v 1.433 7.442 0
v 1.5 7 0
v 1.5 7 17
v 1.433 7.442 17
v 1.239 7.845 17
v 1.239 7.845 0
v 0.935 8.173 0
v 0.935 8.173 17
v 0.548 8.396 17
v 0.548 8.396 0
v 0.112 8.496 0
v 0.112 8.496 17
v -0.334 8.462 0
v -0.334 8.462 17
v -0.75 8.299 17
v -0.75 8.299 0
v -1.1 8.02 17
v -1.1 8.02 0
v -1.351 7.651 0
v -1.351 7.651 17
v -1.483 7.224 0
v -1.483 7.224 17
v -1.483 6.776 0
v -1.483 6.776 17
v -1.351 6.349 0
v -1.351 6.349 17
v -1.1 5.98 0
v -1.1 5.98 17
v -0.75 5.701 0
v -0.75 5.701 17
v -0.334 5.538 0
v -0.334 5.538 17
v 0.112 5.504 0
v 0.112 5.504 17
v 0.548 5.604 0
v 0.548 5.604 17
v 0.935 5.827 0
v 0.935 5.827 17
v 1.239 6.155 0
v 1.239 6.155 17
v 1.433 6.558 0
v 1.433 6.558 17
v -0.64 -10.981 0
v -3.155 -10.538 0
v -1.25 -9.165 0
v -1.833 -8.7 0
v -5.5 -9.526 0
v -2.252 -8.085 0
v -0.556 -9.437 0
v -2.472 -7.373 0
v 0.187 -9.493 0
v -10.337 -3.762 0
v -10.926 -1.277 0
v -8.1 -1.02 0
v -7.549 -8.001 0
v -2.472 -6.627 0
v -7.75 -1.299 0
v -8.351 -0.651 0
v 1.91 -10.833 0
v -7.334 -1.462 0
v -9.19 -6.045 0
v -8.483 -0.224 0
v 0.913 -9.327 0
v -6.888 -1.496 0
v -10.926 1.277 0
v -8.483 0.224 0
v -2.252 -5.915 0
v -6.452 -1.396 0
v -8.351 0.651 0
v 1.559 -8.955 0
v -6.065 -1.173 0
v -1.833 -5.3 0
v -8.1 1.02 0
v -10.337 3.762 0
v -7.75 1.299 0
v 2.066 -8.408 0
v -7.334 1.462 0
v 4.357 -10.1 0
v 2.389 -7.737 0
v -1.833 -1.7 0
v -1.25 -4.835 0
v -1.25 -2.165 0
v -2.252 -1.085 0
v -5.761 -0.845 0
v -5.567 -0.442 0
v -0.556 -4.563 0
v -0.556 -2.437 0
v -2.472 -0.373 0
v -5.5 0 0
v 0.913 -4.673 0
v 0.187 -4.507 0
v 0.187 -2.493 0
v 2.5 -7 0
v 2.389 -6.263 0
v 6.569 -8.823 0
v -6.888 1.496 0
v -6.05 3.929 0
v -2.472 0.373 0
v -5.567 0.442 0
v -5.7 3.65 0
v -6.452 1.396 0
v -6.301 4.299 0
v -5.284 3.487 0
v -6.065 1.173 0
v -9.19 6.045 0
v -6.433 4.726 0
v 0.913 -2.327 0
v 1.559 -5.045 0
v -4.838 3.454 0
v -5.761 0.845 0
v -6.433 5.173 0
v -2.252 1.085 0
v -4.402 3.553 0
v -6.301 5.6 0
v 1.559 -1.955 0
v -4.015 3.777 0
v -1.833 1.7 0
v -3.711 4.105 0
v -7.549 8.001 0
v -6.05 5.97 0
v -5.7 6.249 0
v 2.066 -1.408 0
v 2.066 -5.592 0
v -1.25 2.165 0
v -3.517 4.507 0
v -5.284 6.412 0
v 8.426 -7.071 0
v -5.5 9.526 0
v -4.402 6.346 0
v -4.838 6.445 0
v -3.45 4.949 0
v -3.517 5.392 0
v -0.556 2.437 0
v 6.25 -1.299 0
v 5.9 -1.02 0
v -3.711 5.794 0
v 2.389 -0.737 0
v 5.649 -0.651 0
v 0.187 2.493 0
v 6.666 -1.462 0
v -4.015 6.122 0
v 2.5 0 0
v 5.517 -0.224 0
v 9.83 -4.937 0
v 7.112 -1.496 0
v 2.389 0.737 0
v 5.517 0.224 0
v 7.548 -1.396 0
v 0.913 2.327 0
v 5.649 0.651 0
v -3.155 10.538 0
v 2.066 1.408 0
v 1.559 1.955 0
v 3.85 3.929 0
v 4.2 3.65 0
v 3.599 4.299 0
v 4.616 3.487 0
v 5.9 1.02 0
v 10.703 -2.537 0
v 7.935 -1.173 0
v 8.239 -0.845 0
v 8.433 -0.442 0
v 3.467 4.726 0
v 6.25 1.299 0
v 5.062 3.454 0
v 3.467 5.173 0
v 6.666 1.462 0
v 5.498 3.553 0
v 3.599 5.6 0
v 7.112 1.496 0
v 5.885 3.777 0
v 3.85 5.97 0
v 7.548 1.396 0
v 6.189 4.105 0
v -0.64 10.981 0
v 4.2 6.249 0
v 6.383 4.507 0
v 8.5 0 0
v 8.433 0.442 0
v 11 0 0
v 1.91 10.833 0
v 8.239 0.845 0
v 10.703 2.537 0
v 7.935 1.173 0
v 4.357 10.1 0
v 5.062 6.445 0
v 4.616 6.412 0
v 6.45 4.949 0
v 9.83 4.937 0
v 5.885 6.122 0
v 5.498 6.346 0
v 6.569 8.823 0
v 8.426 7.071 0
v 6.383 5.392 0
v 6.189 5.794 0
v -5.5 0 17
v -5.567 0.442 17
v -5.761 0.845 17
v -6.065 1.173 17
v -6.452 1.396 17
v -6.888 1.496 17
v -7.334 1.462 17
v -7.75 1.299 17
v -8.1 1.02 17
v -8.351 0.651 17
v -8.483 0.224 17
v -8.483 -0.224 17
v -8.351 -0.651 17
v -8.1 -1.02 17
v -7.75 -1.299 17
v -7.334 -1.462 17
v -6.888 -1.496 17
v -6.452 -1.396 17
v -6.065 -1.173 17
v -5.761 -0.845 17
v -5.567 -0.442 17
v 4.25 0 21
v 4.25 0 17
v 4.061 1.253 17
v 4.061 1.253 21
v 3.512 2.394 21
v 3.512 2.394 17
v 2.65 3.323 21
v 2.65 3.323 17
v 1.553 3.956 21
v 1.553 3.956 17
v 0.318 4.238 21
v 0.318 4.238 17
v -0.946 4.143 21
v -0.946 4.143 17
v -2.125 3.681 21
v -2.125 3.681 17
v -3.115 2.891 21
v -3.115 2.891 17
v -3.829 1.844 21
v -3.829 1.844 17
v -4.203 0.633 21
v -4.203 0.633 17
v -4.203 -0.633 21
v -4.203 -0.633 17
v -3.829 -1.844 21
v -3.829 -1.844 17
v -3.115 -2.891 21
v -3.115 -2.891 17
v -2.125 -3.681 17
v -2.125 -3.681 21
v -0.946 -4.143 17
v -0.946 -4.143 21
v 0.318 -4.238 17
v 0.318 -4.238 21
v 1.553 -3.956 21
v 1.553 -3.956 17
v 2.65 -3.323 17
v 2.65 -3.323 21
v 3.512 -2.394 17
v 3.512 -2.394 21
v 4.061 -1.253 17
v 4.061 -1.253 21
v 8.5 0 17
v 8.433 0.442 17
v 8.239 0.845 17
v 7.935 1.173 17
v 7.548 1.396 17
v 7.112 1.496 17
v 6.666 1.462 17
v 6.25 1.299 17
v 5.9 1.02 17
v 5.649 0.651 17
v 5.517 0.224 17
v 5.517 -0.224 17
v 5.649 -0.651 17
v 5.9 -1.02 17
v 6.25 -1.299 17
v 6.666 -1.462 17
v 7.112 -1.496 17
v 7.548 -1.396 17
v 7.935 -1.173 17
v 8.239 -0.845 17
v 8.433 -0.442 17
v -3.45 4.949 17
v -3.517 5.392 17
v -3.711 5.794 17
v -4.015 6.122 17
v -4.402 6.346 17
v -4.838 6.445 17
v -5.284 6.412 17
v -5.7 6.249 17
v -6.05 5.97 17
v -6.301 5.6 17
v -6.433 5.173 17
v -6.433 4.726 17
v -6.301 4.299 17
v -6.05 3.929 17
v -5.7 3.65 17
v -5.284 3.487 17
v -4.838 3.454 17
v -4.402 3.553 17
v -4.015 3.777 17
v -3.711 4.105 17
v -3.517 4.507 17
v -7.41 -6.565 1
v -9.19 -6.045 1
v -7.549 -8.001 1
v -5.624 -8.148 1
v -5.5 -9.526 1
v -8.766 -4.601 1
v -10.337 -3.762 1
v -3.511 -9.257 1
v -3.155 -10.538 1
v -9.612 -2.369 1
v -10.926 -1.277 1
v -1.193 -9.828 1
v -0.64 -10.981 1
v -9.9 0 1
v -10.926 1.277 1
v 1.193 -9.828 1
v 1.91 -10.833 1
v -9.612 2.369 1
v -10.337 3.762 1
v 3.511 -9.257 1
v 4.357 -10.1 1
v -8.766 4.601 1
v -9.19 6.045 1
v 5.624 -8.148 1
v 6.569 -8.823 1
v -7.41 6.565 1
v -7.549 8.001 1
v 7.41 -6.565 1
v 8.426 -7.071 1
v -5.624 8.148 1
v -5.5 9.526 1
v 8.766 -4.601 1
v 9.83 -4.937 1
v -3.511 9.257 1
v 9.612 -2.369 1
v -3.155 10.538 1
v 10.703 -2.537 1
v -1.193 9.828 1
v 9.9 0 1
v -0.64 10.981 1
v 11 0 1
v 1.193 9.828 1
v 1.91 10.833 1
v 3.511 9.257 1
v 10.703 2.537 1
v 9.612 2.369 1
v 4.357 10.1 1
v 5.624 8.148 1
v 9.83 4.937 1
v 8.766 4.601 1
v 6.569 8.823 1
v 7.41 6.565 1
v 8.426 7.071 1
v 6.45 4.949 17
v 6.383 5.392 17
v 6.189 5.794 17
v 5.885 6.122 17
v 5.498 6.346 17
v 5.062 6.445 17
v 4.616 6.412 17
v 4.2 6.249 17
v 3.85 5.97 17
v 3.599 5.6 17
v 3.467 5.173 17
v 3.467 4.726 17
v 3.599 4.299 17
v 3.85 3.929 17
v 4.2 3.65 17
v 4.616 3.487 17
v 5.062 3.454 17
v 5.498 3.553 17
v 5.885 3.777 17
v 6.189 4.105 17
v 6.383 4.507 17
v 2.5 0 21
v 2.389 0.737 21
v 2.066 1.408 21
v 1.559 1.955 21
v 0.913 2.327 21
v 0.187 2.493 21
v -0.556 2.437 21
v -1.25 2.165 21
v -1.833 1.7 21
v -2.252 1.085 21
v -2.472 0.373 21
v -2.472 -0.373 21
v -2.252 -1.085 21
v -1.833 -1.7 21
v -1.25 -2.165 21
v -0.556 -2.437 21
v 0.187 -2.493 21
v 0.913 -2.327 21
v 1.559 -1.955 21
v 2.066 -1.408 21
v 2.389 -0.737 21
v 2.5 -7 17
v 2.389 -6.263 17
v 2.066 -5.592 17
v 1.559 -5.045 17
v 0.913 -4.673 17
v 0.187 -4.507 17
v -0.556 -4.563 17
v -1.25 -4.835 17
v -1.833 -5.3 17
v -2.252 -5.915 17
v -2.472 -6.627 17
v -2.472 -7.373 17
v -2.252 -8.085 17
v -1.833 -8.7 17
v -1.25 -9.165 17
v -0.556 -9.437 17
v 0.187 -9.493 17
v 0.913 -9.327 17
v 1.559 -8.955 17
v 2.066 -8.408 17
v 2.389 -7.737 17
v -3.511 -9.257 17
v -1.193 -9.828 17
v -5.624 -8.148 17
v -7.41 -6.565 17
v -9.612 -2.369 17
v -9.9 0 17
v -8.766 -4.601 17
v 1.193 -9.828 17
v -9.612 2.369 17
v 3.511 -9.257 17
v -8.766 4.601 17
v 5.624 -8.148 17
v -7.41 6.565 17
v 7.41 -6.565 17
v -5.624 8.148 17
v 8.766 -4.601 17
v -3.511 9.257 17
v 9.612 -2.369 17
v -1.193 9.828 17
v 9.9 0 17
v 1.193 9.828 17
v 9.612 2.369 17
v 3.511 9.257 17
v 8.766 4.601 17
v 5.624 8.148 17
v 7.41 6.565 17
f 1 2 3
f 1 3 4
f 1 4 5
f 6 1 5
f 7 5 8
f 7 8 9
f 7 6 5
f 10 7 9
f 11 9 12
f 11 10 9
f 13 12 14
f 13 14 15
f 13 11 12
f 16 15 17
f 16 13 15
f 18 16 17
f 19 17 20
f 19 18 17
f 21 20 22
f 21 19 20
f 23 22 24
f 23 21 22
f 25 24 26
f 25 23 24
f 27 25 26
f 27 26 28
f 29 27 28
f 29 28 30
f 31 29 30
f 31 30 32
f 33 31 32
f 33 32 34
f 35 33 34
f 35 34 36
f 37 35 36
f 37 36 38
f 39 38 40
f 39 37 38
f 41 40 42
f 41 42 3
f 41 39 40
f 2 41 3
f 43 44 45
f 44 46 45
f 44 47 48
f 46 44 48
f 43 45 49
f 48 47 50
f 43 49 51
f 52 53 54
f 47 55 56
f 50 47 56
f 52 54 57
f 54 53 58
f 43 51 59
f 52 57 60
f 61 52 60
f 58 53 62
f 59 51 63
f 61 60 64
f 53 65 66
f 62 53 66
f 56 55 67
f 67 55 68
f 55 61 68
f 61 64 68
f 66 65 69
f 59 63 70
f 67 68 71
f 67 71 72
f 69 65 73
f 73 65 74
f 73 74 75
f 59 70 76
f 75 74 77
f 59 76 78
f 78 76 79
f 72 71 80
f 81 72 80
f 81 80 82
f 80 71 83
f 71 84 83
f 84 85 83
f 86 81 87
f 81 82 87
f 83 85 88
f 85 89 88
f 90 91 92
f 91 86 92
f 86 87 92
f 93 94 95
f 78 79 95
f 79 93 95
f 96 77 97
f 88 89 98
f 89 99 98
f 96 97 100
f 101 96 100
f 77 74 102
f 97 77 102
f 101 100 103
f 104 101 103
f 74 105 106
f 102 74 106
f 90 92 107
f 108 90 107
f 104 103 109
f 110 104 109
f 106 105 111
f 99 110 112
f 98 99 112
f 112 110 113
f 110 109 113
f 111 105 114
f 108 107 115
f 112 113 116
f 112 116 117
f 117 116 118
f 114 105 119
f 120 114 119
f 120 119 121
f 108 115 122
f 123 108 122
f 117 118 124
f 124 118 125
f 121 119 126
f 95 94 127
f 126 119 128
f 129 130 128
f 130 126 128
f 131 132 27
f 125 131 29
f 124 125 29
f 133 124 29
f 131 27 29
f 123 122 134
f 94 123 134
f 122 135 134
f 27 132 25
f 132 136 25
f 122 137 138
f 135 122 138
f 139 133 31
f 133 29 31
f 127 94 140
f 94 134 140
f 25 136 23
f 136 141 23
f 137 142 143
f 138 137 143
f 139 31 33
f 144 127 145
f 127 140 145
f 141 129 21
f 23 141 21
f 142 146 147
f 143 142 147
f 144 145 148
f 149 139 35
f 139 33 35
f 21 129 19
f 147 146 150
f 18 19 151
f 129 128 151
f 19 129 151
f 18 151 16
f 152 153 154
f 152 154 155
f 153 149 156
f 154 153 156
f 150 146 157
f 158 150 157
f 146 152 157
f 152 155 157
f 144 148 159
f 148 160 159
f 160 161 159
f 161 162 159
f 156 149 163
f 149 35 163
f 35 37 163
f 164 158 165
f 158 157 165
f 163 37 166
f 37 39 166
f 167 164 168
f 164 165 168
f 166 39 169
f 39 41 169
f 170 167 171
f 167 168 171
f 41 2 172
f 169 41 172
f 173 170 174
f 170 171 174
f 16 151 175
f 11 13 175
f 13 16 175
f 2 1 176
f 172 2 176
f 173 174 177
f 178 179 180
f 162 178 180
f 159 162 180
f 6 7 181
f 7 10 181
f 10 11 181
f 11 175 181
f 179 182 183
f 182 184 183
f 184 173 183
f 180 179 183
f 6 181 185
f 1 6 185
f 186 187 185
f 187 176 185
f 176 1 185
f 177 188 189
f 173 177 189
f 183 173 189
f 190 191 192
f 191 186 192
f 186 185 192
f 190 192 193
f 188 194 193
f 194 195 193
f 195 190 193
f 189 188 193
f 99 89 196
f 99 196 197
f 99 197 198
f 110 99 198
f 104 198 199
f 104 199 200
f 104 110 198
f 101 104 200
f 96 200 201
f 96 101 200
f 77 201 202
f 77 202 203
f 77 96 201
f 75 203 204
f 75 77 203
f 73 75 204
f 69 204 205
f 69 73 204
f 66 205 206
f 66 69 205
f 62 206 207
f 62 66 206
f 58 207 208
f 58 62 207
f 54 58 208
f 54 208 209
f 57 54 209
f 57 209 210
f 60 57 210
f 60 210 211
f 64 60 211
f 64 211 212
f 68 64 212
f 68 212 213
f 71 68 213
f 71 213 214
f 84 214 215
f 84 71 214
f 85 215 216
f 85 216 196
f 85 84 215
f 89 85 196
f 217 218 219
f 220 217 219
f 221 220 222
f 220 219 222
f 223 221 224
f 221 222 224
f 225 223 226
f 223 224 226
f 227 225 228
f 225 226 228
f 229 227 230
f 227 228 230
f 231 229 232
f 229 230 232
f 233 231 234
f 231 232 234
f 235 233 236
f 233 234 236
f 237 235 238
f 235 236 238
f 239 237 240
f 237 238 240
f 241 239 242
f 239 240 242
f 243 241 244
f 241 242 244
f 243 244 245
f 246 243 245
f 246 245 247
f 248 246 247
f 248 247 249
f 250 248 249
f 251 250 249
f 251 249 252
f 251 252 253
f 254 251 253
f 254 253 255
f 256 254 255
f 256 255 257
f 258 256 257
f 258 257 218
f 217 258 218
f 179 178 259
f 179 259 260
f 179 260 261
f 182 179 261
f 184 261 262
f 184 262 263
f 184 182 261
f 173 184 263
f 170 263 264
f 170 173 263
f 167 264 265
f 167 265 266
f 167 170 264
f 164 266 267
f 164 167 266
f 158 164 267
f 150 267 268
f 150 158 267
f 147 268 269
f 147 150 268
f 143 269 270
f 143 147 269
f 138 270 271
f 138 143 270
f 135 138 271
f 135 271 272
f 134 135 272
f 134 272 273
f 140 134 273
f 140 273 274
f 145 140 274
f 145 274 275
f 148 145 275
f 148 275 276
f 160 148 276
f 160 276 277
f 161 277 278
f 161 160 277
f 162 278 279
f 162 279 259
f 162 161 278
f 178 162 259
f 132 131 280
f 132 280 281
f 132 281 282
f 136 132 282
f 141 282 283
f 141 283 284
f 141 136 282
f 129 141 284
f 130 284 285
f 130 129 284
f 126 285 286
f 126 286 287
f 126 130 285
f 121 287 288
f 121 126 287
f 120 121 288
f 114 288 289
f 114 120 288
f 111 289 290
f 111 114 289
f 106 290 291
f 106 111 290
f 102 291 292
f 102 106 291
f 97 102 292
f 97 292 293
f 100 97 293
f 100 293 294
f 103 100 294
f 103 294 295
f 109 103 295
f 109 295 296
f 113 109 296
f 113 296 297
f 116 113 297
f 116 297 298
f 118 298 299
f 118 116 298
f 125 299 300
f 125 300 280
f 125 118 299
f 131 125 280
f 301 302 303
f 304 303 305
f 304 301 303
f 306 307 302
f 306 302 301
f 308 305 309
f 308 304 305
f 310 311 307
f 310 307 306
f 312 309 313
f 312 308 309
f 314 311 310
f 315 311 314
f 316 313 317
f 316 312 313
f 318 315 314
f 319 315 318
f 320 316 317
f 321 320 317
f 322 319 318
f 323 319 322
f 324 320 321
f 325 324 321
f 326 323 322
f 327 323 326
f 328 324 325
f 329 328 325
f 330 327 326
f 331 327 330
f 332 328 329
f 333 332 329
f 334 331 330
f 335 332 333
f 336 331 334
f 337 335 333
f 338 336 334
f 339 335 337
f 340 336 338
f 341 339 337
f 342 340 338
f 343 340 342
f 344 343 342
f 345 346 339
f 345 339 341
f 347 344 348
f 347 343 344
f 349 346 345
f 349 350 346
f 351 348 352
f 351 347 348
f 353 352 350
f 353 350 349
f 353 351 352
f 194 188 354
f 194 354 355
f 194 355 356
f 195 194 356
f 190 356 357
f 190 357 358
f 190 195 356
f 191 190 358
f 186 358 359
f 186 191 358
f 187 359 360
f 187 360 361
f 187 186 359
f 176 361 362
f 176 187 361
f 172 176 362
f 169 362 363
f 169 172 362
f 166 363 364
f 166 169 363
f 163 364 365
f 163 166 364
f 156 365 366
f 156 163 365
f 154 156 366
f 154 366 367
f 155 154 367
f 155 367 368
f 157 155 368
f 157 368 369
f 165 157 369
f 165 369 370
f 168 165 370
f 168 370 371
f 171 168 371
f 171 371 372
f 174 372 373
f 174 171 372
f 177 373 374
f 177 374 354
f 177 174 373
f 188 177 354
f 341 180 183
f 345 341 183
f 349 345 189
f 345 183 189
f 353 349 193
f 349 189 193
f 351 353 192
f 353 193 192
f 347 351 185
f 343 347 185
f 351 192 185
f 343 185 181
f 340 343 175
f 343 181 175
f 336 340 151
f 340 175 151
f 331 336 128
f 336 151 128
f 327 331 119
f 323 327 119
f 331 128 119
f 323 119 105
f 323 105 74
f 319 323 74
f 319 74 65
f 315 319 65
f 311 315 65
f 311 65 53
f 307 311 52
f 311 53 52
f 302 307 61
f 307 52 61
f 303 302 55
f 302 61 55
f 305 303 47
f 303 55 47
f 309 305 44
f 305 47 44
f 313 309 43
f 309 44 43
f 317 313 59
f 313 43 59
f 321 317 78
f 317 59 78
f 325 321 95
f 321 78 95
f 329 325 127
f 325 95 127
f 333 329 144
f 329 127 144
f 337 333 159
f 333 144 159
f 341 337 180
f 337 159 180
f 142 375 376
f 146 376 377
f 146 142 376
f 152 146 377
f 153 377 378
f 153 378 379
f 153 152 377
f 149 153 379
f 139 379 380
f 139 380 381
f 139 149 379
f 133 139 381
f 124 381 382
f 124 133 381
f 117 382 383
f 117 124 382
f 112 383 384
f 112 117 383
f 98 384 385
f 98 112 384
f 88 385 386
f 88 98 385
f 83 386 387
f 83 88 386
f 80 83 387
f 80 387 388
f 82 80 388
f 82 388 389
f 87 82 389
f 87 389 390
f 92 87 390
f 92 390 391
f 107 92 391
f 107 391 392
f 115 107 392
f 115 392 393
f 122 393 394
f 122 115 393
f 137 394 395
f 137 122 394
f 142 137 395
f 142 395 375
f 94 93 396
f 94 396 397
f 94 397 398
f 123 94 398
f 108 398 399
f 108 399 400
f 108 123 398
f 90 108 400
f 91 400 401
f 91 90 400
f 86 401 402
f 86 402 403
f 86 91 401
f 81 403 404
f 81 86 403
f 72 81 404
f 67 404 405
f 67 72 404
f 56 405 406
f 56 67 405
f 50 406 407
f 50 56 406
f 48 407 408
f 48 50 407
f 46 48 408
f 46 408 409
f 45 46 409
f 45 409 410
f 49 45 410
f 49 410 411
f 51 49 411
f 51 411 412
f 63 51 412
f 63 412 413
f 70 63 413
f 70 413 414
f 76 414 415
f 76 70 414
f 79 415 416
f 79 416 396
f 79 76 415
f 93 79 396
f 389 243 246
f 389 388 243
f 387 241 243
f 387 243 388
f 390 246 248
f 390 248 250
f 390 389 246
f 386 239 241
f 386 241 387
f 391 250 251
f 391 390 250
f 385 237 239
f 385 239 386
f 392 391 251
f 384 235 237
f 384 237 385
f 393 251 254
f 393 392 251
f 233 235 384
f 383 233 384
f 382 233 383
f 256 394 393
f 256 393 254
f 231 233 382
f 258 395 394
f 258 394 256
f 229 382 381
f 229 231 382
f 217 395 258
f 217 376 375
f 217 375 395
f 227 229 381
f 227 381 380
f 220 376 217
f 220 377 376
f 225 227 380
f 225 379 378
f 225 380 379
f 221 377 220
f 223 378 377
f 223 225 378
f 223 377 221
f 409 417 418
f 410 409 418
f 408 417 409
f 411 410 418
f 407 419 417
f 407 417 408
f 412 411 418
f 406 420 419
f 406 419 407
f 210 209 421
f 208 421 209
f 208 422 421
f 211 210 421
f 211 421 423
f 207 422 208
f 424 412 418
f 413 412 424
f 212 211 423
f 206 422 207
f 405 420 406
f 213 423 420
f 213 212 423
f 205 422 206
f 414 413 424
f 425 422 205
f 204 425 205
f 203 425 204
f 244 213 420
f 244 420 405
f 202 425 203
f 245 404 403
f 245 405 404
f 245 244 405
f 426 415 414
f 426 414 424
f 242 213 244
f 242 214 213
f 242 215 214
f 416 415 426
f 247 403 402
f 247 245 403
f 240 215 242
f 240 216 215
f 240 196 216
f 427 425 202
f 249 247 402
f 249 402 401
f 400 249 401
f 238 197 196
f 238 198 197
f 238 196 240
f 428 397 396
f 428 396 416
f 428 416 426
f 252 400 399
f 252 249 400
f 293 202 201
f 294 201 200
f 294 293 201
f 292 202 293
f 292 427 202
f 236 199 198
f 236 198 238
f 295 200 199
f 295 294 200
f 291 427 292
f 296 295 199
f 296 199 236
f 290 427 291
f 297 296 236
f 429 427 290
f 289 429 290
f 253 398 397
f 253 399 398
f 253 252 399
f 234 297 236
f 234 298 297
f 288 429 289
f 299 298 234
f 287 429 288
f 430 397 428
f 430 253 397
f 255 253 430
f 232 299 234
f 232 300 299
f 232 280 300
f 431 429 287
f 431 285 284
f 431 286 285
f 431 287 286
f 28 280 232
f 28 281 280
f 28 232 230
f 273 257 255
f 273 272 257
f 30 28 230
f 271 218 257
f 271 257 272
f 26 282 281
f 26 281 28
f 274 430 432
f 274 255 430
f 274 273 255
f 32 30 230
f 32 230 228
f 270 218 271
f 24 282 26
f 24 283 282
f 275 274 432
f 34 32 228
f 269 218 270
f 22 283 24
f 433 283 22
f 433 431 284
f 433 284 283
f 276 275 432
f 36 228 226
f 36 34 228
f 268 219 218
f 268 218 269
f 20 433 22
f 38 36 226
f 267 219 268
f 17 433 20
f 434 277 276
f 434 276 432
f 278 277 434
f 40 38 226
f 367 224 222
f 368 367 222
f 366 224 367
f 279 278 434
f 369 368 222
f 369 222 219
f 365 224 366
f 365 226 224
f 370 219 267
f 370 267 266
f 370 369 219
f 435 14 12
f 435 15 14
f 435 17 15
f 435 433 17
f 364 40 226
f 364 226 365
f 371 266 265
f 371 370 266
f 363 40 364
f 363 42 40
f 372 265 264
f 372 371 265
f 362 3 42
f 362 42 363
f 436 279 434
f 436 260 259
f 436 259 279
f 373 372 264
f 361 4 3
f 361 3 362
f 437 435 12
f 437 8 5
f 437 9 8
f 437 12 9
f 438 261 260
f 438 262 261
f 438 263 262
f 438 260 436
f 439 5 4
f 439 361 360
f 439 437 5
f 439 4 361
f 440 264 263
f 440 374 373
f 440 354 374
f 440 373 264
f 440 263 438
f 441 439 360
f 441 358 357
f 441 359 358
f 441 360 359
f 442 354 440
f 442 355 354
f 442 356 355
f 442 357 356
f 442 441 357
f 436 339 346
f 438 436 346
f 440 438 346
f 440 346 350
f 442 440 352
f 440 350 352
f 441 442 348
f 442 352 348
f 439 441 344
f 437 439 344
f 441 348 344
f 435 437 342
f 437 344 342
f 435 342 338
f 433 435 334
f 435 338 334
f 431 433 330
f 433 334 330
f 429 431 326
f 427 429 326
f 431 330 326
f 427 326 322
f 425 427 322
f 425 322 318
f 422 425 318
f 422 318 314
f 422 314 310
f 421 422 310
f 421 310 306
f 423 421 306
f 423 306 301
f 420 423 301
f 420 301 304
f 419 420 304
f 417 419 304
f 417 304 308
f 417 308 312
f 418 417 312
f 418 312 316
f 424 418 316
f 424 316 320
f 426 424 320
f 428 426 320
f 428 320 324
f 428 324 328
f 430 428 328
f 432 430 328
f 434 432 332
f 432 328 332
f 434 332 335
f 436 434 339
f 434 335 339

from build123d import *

# Parameters (mm, degrees)
F0_R     = 4.25
F0_R_2   = 2.5
F1_DEPTH = 21
F0_R_3   = 9.9
F0_R_4   = 1.5
F2_DEPTH = 17
F0_R_5   = 11
F3_DEPTH = 1


with BuildPart() as f1:
    # F0 (on Top) → F1 (new body)
    with BuildSketch(Plane.XY):
        Circle(F0_R)
        Circle(F0_R_2, mode=Mode.SUBTRACT)
    extrude(amount=F1_DEPTH)

    # F0 (on Top) → F2 (join)
    with BuildSketch(Plane.XY):
        Circle(F0_R_3)
        with Locations((0, -7)):
            Circle(F0_R_2, mode=Mode.SUBTRACT)
        with Locations((-7, 0)):
            Circle(F0_R_4, mode=Mode.SUBTRACT)
        with Locations((-4.95, 4.949495)):
            Circle(F0_R_4, mode=Mode.SUBTRACT)
        Circle(F0_R, mode=Mode.SUBTRACT)
        with Locations((4.95, 4.949495)):
            Circle(F0_R_4, mode=Mode.SUBTRACT)
        with Locations((7, 0)):
            Circle(F0_R_4, mode=Mode.SUBTRACT)
        with Locations((0, 7)):
            Circle(F0_R_4, mode=Mode.SUBTRACT)
    extrude(amount=F2_DEPTH)

    # F0 (on Top) → F3 (join)
    with BuildSketch(Plane.XY):
        Circle(F0_R_5)
        Circle(F0_R_3, mode=Mode.SUBTRACT)
    extrude(amount=F3_DEPTH)


solid = f1.part
